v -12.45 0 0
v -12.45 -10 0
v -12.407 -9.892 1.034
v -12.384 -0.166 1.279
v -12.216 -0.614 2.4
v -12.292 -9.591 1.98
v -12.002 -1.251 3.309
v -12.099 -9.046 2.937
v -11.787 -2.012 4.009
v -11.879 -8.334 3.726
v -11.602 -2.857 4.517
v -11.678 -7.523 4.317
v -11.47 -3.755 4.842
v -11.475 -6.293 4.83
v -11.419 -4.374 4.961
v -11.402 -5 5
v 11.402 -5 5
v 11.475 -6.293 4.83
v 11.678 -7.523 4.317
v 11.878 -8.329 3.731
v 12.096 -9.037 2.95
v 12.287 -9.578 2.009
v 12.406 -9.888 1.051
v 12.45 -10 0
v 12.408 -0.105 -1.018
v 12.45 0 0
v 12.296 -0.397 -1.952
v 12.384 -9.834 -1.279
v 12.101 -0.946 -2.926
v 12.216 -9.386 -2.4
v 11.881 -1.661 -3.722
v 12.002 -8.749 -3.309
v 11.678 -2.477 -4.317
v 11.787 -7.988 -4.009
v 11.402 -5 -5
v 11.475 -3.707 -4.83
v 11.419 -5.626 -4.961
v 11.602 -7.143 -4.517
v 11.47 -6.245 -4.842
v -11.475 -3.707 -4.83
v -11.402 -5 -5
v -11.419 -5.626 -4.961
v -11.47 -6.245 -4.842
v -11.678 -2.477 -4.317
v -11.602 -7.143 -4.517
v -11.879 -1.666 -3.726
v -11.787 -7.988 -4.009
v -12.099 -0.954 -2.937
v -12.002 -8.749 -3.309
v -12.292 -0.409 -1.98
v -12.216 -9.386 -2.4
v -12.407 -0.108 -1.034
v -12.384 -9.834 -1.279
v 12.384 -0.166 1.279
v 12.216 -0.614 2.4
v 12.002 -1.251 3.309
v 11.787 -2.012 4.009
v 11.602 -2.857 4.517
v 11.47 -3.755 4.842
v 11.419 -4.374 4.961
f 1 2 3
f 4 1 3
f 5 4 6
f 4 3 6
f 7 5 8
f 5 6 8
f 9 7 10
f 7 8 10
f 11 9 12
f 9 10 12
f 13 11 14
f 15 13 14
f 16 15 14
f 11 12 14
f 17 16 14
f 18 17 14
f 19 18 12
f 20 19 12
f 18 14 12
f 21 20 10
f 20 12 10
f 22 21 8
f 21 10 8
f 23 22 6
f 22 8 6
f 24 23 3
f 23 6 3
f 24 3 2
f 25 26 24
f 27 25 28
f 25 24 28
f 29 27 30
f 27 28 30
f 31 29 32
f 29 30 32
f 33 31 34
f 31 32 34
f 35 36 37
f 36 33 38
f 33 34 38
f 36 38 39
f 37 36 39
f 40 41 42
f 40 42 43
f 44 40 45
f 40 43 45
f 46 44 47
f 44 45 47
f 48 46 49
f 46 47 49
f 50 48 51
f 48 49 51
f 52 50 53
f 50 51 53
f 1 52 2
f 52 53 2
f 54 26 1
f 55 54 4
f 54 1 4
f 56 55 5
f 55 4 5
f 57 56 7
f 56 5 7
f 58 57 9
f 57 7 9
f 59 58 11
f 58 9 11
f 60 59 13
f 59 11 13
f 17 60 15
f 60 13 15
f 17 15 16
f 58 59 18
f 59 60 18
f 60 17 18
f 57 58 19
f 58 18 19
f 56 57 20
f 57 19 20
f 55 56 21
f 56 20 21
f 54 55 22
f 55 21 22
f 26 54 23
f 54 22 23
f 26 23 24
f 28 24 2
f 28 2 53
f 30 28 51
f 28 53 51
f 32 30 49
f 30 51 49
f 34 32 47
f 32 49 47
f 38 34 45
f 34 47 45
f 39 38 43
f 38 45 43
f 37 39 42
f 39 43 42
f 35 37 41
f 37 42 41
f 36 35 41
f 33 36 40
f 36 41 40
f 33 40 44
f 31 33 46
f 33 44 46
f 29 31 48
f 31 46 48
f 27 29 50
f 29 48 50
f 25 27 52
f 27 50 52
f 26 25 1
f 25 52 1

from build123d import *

# Parameters (mm, degrees)
F0_W     = 24.9
F0_H     = 10
F1_DEPTH = 10
F4_DEPTH = 24.901
F5_DEPTH = 10.001


with BuildPart() as f1:
    # F0 (on Front) → F1 (new body)
    with BuildSketch(Plane.XZ):
        Rectangle(F0_W, F0_H)
    extrude(amount=F1_DEPTH)

    # F3 (on face) → F4 (cut, through all)
    with BuildSketch(Plane(origin=(-12.45, 0, 0), x_dir=(0, -1, 0), z_dir=(-1, 0, 0))):
        with BuildLine():
            ThreePointArc((0, 0), (1.4644660941, 3.5355339059), (5, 5))
            Line((5, 5), (0, 5))
            Line((0, 5), (0, 0))
        make_face()
        with BuildLine():
            ThreePointArc((5, 5), (8.5355339059, 3.5355339059), (10, 0))
            Line((10, 0), (10, 5))
            Line((10, 5), (5, 5))
        make_face()
        with BuildLine():
            Line((0, -5), (5, -5))
            ThreePointArc((5, -5), (1.4644660941, -3.5355339059), (0, 0))
            Line((0, 0), (0, -5))
        make_face()
        with BuildLine():
            Line((10, -5), (10, 0))
            ThreePointArc((10, 0), (8.5355339059, -3.5355339059), (5, -5))
            Line((5, -5), (10, -5))
        make_face()
    extrude(amount=-F4_DEPTH, mode=Mode.SUBTRACT)

    # F2 (on face) → F5 (cut, through all)
    with BuildSketch(Plane.XZ.offset(10)):
        with BuildLine():
            ThreePointArc((-12.45, 0), (-12.1851488571, 2.5543389223), (-11.4018638827, 5))
            Line((-11.4018638827, 5), (-12.45, 5))
            Line((-12.45, 5), (-12.45, 0))
        make_face()
        with BuildLine():
            Line((-12.45, -5), (-11.4018638827, -5))
            ThreePointArc((-11.4018638827, -5), (-12.1851488571, -2.5543389223), (-12.45, 0))
            Line((-12.45, 0), (-12.45, -5))
        make_face()
        with BuildLine():
            ThreePointArc((11.4018638827, 5), (12.1851488571, 2.5543389223), (12.45, 0))
            Line((12.45, 0), (12.45, 5))
            Line((12.45, 5), (11.4018638827, 5))
        make_face()
        with BuildLine():
            Line((12.45, -5), (12.45, 0))
            ThreePointArc((12.45, 0), (12.1851488571, -2.5543389223), (11.4018638827, -5))
            Line((11.4018638827, -5), (12.45, -5))
        make_face()
    extrude(amount=-F5_DEPTH, mode=Mode.SUBTRACT)


solid = f1.part
